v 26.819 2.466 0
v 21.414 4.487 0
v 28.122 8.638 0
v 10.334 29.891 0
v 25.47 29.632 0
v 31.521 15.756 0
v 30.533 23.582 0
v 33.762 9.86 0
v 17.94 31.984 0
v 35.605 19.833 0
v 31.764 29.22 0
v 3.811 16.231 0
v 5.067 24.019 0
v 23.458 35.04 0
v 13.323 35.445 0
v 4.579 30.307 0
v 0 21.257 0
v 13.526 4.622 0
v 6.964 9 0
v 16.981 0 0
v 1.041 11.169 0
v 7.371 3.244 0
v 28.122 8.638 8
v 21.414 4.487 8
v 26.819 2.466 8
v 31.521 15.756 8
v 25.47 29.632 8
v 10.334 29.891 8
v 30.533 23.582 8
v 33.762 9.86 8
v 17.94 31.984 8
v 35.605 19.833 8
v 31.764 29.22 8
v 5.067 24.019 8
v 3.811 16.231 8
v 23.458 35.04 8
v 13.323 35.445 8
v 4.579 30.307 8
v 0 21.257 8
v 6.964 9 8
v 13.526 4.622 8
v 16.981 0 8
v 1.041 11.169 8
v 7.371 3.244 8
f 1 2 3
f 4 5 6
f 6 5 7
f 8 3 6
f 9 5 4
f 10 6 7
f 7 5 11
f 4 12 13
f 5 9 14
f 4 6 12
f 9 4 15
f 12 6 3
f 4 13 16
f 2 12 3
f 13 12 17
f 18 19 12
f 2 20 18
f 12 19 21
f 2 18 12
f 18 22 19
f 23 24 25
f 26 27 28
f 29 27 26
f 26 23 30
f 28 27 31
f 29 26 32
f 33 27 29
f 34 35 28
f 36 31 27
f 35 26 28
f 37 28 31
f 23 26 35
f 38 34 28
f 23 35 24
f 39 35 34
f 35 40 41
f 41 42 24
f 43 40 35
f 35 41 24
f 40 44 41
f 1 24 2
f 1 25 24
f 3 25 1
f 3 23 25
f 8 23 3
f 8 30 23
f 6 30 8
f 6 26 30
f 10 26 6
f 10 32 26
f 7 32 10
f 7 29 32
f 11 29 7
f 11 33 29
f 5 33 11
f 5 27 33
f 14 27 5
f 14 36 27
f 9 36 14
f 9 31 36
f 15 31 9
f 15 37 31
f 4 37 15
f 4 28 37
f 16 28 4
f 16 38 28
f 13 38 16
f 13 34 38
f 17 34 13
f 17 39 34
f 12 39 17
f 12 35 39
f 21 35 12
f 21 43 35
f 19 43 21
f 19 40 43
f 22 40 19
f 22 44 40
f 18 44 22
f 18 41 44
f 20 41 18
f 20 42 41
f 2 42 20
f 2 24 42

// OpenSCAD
$fn = 32;

// ----------------------------------------------------------------------
// Chain sprocket: 11 teeth, 14 mm root radius
// ----------------------------------------------------------------------

// --- parameters (mm) ---
profile_height = 8;       // extrusion height
profile_points = 22;      // points of the closed outline

profile = [[31.521, 15.756], [35.605, 19.833], [30.533, 23.582], [31.764, 29.22], [25.47, 29.632], [23.458, 35.04], [17.94, 31.984], [13.323, 35.445], [10.334, 29.891], [4.579, 30.307], [5.067, 24.019], [0, 21.257], [3.811, 16.231], [1.041, 11.169], [6.964, 9], [7.371, 3.244], [13.526, 4.622], [16.981, 0], [21.414, 4.487], [26.819, 2.466], [28.122, 8.638], [33.762, 9.86]];  // single closed polygon, 22 points, counter clockwise

// --- the one profile operation ---
linear_extrude(height = profile_height) polygon(points = profile);
